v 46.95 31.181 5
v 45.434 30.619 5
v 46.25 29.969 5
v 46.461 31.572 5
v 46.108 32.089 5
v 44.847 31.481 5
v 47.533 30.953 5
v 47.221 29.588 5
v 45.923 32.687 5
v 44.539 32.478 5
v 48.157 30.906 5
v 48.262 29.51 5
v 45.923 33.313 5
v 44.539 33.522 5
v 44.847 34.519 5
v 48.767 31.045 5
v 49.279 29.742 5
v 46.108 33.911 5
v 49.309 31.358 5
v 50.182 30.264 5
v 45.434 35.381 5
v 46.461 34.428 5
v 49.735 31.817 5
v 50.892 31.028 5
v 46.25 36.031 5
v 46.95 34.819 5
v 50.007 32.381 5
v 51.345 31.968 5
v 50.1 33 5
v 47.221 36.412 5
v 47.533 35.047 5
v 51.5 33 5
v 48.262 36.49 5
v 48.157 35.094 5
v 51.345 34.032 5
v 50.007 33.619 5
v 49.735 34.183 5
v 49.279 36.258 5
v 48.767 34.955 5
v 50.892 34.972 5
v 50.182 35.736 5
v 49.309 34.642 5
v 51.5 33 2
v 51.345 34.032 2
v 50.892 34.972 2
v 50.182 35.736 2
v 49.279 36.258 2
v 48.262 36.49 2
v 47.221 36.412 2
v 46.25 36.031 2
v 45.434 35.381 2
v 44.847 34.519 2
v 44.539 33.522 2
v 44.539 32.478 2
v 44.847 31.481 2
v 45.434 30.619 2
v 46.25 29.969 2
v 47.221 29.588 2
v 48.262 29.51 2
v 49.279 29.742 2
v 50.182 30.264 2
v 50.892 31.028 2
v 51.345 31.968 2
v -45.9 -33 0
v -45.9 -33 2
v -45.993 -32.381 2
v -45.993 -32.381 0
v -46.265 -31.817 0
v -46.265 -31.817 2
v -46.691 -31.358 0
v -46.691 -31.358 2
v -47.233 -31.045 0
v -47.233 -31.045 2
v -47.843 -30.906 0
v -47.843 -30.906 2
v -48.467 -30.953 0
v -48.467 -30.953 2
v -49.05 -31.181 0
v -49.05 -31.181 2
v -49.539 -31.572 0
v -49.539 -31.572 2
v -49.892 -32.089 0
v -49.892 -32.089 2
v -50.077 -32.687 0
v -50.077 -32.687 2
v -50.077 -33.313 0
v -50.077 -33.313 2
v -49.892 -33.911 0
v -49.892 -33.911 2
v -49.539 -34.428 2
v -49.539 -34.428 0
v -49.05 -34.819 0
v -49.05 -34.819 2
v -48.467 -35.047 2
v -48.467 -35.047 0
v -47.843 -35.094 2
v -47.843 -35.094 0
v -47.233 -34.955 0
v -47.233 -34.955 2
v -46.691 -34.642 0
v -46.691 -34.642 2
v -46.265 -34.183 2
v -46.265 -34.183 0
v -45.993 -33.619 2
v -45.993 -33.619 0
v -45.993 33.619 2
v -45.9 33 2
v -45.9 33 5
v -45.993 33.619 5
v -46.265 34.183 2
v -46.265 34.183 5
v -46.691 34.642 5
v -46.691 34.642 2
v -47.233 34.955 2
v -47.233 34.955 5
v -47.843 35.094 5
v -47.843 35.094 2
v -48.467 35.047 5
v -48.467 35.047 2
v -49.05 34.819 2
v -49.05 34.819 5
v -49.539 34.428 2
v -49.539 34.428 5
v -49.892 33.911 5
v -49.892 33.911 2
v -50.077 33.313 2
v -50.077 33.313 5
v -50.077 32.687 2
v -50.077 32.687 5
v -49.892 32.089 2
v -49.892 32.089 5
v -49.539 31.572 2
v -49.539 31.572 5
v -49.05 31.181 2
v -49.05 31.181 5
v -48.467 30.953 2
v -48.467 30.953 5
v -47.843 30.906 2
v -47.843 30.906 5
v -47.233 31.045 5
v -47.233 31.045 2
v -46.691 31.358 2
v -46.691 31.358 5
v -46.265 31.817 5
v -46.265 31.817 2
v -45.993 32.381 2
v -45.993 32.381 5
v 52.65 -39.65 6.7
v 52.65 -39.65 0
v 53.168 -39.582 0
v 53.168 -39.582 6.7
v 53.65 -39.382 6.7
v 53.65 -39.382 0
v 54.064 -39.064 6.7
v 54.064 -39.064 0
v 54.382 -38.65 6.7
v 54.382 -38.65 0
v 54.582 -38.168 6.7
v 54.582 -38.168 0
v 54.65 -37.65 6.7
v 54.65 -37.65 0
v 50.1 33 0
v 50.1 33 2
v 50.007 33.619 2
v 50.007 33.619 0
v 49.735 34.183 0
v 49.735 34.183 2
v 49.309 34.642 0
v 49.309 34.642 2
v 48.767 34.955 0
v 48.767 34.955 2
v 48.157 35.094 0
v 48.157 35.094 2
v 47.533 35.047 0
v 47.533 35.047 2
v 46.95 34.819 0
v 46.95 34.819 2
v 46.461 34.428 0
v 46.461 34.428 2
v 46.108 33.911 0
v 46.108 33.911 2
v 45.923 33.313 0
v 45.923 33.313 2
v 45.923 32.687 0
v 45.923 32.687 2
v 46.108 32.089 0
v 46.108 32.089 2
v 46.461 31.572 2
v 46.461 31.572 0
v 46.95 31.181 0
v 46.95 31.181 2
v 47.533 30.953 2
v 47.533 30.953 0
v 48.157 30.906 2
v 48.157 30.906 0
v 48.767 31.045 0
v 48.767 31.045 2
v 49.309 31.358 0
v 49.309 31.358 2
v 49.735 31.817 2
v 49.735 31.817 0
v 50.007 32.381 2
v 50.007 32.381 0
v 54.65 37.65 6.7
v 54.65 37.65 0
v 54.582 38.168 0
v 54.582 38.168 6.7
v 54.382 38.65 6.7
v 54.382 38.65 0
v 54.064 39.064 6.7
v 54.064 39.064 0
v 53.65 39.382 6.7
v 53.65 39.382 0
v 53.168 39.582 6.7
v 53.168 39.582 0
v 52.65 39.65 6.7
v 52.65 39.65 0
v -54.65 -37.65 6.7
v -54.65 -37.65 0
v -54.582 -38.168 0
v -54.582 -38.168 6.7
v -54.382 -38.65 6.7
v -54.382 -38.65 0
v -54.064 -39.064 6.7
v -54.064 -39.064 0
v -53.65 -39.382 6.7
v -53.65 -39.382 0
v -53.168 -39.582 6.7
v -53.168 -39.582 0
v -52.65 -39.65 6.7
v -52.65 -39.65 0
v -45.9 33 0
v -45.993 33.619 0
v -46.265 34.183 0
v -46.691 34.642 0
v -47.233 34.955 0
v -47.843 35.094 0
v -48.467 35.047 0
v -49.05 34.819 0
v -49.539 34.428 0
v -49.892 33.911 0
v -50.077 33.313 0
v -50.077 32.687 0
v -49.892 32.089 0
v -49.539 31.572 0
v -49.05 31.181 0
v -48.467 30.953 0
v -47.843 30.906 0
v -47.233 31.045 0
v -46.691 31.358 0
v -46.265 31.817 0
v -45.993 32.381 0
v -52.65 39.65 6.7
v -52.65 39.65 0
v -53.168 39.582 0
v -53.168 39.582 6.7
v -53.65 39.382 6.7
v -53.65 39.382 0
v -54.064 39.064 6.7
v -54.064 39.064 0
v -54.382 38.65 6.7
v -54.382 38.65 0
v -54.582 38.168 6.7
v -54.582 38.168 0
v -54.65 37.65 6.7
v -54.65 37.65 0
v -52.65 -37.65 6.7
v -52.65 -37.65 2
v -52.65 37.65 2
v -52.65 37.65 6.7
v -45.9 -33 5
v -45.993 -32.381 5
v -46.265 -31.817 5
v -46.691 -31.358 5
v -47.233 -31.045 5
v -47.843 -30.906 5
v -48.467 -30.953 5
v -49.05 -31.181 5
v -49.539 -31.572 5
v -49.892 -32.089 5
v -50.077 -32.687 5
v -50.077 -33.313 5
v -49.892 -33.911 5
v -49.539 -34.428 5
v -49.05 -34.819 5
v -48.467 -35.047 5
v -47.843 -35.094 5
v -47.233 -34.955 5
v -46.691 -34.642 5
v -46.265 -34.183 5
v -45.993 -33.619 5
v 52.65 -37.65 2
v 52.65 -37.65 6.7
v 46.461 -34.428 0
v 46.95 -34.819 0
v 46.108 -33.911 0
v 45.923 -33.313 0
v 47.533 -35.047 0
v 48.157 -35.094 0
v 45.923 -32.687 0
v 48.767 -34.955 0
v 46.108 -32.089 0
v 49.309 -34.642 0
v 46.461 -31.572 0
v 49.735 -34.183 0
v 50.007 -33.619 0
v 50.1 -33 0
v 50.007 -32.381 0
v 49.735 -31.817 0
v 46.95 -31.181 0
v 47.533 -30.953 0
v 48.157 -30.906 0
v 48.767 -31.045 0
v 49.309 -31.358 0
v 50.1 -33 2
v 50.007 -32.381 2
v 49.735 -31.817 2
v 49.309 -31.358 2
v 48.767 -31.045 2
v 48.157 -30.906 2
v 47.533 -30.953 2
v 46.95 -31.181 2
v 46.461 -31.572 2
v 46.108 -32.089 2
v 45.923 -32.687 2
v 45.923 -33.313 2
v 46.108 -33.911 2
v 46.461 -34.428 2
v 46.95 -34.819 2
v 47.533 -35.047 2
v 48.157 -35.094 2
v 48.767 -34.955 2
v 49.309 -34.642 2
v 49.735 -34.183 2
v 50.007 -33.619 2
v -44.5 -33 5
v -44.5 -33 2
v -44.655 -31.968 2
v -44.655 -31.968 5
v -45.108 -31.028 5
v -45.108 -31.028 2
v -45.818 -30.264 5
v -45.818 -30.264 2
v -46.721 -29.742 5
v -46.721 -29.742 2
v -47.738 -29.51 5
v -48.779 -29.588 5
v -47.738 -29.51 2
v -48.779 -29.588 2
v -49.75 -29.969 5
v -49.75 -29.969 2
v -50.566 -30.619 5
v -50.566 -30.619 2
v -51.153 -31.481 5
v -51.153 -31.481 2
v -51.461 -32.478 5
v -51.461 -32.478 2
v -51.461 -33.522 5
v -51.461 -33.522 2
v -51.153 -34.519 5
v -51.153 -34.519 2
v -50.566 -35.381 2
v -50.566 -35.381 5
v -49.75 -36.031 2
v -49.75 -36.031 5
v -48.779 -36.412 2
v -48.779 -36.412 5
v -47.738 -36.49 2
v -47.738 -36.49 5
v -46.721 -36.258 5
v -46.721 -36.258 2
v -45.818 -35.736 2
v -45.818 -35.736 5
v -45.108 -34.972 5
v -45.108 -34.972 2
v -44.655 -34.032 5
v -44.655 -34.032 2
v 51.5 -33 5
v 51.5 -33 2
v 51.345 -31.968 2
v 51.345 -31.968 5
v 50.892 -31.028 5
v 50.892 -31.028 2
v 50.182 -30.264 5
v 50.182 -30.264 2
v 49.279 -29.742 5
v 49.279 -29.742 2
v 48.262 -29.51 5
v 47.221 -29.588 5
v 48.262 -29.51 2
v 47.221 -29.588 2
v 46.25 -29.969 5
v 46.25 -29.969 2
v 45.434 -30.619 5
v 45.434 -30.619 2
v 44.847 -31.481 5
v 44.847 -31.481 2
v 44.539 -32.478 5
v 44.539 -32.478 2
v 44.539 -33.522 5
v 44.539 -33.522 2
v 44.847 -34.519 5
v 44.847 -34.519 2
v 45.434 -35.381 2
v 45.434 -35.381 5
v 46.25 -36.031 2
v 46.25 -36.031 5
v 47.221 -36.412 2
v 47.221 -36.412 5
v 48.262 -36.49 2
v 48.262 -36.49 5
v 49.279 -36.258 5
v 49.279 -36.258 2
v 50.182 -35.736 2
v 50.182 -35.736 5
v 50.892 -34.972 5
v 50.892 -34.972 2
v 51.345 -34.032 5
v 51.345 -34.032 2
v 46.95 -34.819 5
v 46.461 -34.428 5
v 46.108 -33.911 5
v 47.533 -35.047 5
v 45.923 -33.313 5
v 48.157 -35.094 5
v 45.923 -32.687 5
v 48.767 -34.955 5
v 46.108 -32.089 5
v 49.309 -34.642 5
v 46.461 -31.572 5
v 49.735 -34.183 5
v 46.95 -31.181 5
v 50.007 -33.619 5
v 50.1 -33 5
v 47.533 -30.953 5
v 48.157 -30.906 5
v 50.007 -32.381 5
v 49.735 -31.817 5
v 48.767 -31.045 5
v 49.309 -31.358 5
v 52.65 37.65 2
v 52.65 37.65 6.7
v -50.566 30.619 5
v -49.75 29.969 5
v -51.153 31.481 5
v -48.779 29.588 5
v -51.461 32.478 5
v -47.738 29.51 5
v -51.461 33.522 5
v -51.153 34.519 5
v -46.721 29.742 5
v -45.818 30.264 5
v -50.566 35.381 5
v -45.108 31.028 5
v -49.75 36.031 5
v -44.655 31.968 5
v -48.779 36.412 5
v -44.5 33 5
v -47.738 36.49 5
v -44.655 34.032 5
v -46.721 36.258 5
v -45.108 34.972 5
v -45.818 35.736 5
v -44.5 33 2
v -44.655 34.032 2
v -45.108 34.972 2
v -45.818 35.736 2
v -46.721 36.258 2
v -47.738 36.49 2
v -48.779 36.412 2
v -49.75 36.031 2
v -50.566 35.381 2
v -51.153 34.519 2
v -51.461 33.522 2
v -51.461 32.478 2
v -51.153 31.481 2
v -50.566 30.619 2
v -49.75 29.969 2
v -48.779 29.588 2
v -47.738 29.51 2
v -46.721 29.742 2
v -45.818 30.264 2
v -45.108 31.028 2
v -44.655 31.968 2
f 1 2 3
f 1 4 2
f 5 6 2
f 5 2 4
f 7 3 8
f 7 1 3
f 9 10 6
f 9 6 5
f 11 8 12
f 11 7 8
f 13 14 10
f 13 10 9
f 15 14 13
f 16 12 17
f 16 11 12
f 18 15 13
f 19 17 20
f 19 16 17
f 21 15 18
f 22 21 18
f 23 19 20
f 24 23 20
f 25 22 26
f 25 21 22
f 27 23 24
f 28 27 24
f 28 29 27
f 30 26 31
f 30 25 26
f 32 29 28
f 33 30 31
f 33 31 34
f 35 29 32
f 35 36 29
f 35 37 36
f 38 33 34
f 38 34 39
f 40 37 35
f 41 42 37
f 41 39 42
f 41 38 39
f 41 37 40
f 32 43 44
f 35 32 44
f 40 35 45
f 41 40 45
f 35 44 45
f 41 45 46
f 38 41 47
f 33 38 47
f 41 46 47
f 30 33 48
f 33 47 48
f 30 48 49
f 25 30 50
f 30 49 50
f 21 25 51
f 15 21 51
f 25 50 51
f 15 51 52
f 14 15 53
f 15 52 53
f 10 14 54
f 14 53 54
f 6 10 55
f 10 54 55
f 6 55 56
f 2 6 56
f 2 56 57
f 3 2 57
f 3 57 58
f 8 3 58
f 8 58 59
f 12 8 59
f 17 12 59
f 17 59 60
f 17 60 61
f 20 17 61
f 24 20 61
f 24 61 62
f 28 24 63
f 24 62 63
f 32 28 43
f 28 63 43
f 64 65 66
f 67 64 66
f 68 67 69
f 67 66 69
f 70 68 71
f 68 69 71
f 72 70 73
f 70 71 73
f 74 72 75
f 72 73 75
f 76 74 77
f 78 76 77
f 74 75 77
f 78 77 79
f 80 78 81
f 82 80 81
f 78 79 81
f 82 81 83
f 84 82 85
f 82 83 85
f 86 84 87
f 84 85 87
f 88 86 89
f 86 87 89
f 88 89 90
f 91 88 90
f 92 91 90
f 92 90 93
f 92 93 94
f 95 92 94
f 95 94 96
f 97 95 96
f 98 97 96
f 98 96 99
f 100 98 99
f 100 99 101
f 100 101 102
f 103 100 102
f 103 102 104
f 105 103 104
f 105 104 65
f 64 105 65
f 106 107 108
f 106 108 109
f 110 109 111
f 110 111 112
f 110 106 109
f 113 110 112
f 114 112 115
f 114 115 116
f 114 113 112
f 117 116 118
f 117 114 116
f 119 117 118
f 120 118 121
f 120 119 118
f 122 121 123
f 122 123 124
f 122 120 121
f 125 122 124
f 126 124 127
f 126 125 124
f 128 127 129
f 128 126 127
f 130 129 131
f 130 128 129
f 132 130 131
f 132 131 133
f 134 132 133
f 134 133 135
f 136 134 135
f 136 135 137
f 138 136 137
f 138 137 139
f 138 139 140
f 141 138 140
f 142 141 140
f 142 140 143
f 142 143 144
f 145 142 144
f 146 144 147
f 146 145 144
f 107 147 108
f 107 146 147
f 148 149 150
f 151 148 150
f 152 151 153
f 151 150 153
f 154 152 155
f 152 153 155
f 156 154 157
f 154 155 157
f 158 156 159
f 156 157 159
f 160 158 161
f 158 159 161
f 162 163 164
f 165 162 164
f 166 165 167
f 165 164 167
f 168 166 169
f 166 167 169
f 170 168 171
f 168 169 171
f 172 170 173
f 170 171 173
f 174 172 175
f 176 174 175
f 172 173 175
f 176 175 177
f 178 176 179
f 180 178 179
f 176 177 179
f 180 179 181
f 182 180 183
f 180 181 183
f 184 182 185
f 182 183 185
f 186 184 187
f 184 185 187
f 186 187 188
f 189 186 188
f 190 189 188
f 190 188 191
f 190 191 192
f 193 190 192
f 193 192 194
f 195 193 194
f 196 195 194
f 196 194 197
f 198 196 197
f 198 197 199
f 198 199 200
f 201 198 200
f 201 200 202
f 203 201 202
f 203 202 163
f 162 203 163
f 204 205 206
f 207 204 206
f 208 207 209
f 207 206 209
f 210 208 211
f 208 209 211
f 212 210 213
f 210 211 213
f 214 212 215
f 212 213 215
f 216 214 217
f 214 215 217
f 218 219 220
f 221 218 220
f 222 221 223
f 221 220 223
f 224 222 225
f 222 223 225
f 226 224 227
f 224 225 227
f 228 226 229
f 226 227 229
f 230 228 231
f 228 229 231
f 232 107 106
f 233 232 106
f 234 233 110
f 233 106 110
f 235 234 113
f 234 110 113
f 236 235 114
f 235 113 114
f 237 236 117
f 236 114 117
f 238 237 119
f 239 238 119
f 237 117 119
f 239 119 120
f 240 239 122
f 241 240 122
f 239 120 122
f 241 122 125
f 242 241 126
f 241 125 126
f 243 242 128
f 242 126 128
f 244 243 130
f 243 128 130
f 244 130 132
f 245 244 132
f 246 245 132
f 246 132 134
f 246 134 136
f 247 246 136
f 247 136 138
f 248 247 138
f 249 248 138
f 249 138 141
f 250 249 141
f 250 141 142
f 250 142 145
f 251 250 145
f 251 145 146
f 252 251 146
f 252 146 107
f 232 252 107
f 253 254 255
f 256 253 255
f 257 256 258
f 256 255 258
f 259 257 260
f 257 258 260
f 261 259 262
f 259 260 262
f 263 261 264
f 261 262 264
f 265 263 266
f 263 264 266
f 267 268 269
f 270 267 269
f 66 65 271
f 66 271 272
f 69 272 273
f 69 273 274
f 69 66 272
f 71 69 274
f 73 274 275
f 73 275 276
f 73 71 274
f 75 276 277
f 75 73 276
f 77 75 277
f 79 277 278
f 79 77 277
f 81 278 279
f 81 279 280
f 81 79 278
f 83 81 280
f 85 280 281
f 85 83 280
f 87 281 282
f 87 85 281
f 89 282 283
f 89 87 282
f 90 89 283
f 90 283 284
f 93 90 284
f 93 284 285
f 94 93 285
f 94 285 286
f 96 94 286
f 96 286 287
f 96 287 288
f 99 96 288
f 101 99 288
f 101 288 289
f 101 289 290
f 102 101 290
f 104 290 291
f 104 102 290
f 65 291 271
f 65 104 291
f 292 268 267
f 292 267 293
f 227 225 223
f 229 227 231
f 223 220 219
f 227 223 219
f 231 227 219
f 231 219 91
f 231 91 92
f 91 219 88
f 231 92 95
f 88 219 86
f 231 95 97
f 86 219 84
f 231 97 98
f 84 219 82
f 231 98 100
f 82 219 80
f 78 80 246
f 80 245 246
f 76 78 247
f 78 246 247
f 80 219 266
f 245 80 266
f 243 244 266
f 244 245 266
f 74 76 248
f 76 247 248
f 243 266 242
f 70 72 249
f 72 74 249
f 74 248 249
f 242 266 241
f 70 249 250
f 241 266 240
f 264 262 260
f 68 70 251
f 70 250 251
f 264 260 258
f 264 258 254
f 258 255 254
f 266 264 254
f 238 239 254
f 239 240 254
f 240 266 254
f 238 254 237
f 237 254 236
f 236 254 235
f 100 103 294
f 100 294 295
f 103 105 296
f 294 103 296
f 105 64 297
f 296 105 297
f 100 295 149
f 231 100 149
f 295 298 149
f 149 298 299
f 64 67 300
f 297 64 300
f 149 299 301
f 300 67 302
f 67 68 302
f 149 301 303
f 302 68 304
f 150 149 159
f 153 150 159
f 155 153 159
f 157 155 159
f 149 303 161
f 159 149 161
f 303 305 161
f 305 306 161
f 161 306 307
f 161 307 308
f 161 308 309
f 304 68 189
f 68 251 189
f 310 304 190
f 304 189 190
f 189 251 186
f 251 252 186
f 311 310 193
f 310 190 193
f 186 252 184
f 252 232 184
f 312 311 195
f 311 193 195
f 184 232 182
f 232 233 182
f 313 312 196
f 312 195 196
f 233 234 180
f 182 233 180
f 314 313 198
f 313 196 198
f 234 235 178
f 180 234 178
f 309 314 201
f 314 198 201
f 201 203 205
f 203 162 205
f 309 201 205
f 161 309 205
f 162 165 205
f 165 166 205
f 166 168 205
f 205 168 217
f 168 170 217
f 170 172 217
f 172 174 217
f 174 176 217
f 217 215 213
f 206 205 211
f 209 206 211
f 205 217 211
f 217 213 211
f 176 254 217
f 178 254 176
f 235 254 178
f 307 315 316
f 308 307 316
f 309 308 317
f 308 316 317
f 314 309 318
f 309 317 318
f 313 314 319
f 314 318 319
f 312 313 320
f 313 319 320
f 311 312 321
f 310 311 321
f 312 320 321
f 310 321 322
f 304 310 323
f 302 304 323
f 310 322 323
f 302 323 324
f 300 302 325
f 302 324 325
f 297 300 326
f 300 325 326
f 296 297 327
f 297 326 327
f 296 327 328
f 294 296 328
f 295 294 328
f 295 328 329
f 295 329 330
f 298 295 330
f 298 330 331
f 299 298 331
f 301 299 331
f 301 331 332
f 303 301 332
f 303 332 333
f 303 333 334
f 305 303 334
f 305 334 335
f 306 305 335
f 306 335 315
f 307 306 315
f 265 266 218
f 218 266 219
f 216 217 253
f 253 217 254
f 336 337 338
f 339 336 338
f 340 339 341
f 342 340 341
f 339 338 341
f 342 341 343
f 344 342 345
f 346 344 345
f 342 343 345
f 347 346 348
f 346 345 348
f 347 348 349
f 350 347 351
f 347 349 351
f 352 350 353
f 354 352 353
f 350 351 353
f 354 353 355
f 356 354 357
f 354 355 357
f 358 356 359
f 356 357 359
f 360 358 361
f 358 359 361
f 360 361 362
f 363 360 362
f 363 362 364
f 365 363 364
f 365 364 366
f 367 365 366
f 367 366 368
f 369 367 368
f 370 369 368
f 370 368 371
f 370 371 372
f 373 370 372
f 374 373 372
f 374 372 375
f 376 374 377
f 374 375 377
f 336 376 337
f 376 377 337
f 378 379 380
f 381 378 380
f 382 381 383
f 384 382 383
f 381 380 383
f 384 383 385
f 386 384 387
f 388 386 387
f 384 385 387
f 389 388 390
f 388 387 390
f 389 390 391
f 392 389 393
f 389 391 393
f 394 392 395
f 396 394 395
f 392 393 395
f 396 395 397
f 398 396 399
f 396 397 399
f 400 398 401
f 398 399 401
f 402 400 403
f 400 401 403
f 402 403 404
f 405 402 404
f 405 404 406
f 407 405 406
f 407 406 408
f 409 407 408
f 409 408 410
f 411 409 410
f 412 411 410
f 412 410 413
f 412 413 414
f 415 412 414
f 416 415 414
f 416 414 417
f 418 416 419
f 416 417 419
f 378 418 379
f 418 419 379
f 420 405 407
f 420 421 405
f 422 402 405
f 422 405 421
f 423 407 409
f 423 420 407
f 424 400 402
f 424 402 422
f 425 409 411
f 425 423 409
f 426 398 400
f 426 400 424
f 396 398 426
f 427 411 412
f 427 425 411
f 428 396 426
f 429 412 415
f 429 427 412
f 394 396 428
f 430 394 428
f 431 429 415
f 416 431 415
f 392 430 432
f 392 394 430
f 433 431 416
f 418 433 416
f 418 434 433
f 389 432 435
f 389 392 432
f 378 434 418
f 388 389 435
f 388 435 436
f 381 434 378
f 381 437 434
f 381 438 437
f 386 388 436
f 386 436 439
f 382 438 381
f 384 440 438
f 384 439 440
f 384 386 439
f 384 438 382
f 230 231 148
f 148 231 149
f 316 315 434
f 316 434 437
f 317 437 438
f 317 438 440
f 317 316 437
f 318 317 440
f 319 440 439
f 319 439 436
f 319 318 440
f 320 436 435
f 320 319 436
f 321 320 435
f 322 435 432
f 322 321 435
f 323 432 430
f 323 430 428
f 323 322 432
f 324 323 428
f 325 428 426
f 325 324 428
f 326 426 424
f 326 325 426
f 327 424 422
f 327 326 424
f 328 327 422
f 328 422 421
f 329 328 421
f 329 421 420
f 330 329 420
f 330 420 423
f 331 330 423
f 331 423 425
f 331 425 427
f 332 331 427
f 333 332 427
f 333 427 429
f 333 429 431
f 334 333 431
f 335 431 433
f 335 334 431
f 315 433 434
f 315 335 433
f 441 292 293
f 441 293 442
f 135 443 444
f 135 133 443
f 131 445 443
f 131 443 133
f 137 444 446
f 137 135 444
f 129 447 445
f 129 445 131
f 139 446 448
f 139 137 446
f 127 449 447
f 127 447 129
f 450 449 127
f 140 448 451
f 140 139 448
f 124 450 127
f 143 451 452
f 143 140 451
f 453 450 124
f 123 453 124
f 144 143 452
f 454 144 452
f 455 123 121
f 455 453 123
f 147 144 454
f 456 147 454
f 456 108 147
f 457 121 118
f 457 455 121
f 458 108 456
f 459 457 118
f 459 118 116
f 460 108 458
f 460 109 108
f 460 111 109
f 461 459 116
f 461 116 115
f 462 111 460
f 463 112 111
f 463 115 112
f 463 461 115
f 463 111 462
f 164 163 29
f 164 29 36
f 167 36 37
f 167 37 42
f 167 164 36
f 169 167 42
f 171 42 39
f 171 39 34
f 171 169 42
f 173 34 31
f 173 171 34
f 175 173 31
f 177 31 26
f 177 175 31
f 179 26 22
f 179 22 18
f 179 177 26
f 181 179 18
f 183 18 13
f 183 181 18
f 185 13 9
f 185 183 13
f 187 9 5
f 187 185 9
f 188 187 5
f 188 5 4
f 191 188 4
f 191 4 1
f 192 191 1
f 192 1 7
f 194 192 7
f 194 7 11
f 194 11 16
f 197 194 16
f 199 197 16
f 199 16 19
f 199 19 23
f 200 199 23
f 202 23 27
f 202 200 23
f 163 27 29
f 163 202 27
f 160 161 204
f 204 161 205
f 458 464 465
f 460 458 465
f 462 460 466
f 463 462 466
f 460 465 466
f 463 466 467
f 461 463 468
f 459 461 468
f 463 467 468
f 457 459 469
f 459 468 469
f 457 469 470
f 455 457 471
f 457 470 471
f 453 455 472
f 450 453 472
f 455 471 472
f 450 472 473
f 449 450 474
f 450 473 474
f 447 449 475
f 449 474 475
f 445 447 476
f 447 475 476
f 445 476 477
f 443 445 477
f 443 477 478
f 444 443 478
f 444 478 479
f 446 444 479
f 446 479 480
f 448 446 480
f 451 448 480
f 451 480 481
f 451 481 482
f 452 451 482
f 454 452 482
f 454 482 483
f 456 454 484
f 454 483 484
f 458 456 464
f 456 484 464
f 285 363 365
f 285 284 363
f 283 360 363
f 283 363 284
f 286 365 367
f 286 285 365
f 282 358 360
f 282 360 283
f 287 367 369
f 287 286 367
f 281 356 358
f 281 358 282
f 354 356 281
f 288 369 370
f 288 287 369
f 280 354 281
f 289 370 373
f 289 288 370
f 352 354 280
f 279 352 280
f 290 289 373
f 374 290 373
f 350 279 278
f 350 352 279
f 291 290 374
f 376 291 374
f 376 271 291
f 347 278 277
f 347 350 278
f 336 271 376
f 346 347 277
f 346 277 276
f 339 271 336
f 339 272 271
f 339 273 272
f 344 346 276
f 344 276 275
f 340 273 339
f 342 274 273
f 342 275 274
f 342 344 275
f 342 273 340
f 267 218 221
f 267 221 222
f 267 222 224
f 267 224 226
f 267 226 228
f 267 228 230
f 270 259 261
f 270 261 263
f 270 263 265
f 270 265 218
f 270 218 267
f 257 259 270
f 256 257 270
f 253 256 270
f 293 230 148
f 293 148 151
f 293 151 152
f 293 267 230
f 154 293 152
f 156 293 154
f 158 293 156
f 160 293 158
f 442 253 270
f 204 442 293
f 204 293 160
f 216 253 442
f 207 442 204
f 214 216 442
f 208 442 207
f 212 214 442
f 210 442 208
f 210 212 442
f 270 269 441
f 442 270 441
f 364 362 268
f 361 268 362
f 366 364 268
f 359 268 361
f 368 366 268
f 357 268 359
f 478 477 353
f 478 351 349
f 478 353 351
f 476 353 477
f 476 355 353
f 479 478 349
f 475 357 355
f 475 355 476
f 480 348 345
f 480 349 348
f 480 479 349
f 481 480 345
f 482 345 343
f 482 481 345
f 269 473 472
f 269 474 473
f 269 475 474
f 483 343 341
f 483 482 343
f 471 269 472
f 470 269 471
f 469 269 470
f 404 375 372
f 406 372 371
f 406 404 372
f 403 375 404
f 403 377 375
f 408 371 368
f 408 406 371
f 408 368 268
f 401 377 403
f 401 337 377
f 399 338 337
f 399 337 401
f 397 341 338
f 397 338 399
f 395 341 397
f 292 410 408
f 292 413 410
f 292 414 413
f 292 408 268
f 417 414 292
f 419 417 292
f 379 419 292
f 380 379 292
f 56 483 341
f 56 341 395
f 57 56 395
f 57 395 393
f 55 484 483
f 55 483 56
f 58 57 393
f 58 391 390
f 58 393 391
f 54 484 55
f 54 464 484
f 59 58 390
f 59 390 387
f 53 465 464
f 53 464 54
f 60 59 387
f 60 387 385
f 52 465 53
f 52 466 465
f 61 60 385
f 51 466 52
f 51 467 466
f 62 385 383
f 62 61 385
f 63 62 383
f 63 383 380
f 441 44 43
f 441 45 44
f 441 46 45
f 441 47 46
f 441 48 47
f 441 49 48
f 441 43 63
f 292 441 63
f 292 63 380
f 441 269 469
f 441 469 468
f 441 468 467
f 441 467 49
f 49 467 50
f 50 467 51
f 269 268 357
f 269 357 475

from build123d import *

# Parameters (mm, degrees)
F0_W     = 105.3
F0_H     = 75.3
F1_DEPTH = 2
F2_DEPTH = 6.7
F3_R     = 3.5
F3_R_2   = 2.1
F4_DEPTH = 3
F5_DEPTH = 25


with BuildPart() as f1:
    # F0 (on Top) → F1 (new body)
    with BuildSketch(Plane.XY):
        with BuildLine():
            Line((52.65, 39.65), (-52.65, 39.65))
            ThreePointArc((-52.65, 39.65), (-54.0642135624, 39.0642135624), (-54.65, 37.65))
            Line((-54.65, 37.65), (-54.65, -37.65))
            ThreePointArc((-54.65, -37.65), (-54.0642135624, -39.0642135624), (-52.65, -39.65))
            Line((-52.65, -39.65), (52.65, -39.65))
            ThreePointArc((52.65, -39.65), (54.0642135624, -39.0642135624), (54.65, -37.65))
            Line((54.65, -37.65), (54.65, 37.65))
            ThreePointArc((54.65, 37.65), (54.0642135624, 39.0642135624), (52.65, 39.65))
        make_face()
        Rectangle(F0_W, F0_H, mode=Mode.SUBTRACT)
        Rectangle(F0_W, F0_H)
    extrude(amount=F1_DEPTH)

    # F0 (on Top) → F2 (join)
    with BuildSketch(Plane.XY):
        with BuildLine():
            Line((52.65, 39.65), (-52.65, 39.65))
            ThreePointArc((-52.65, 39.65), (-54.0642135624, 39.0642135624), (-54.65, 37.65))
            Line((-54.65, 37.65), (-54.65, -37.65))
            ThreePointArc((-54.65, -37.65), (-54.0642135624, -39.0642135624), (-52.65, -39.65))
            Line((-52.65, -39.65), (52.65, -39.65))
            ThreePointArc((52.65, -39.65), (54.0642135624, -39.0642135624), (54.65, -37.65))
            Line((54.65, -37.65), (54.65, 37.65))
            ThreePointArc((54.65, 37.65), (54.0642135624, 39.0642135624), (52.65, 39.65))
        make_face()
        Rectangle(F0_W, F0_H, mode=Mode.SUBTRACT)
    extrude(amount=F2_DEPTH)

    # F3 (on face) → F4 (join)
    with BuildSketch(Plane.XY.offset(2)):
        with Locations((-48, 33)):
            Circle(F3_R)
        with Locations((-48, 33)):
            Circle(F3_R_2, mode=Mode.SUBTRACT)
        with Locations((48, 33)):
            Circle(F3_R)
        with Locations((48, 33)):
            Circle(F3_R_2, mode=Mode.SUBTRACT)
        with Locations((48, -33)):
            Circle(F3_R)
        with Locations((48, -33)):
            Circle(F3_R_2, mode=Mode.SUBTRACT)
        with Locations((-48, -33)):
            Circle(F3_R)
        with Locations((-48, -33)):
            Circle(F3_R_2, mode=Mode.SUBTRACT)
    extrude(amount=F4_DEPTH)

    # F5 (cut): faces of the model
    f5_faces = [f1.faces().sort_by_distance(p)[0] for p in [
        (-48, 33, 2),
        (48, 33, 2),
        (48, -33, 2),
        (-48, -33, 2),
    ]]
    extrude(f5_faces, amount=-F5_DEPTH, mode=Mode.SUBTRACT)


solid = f1.part
